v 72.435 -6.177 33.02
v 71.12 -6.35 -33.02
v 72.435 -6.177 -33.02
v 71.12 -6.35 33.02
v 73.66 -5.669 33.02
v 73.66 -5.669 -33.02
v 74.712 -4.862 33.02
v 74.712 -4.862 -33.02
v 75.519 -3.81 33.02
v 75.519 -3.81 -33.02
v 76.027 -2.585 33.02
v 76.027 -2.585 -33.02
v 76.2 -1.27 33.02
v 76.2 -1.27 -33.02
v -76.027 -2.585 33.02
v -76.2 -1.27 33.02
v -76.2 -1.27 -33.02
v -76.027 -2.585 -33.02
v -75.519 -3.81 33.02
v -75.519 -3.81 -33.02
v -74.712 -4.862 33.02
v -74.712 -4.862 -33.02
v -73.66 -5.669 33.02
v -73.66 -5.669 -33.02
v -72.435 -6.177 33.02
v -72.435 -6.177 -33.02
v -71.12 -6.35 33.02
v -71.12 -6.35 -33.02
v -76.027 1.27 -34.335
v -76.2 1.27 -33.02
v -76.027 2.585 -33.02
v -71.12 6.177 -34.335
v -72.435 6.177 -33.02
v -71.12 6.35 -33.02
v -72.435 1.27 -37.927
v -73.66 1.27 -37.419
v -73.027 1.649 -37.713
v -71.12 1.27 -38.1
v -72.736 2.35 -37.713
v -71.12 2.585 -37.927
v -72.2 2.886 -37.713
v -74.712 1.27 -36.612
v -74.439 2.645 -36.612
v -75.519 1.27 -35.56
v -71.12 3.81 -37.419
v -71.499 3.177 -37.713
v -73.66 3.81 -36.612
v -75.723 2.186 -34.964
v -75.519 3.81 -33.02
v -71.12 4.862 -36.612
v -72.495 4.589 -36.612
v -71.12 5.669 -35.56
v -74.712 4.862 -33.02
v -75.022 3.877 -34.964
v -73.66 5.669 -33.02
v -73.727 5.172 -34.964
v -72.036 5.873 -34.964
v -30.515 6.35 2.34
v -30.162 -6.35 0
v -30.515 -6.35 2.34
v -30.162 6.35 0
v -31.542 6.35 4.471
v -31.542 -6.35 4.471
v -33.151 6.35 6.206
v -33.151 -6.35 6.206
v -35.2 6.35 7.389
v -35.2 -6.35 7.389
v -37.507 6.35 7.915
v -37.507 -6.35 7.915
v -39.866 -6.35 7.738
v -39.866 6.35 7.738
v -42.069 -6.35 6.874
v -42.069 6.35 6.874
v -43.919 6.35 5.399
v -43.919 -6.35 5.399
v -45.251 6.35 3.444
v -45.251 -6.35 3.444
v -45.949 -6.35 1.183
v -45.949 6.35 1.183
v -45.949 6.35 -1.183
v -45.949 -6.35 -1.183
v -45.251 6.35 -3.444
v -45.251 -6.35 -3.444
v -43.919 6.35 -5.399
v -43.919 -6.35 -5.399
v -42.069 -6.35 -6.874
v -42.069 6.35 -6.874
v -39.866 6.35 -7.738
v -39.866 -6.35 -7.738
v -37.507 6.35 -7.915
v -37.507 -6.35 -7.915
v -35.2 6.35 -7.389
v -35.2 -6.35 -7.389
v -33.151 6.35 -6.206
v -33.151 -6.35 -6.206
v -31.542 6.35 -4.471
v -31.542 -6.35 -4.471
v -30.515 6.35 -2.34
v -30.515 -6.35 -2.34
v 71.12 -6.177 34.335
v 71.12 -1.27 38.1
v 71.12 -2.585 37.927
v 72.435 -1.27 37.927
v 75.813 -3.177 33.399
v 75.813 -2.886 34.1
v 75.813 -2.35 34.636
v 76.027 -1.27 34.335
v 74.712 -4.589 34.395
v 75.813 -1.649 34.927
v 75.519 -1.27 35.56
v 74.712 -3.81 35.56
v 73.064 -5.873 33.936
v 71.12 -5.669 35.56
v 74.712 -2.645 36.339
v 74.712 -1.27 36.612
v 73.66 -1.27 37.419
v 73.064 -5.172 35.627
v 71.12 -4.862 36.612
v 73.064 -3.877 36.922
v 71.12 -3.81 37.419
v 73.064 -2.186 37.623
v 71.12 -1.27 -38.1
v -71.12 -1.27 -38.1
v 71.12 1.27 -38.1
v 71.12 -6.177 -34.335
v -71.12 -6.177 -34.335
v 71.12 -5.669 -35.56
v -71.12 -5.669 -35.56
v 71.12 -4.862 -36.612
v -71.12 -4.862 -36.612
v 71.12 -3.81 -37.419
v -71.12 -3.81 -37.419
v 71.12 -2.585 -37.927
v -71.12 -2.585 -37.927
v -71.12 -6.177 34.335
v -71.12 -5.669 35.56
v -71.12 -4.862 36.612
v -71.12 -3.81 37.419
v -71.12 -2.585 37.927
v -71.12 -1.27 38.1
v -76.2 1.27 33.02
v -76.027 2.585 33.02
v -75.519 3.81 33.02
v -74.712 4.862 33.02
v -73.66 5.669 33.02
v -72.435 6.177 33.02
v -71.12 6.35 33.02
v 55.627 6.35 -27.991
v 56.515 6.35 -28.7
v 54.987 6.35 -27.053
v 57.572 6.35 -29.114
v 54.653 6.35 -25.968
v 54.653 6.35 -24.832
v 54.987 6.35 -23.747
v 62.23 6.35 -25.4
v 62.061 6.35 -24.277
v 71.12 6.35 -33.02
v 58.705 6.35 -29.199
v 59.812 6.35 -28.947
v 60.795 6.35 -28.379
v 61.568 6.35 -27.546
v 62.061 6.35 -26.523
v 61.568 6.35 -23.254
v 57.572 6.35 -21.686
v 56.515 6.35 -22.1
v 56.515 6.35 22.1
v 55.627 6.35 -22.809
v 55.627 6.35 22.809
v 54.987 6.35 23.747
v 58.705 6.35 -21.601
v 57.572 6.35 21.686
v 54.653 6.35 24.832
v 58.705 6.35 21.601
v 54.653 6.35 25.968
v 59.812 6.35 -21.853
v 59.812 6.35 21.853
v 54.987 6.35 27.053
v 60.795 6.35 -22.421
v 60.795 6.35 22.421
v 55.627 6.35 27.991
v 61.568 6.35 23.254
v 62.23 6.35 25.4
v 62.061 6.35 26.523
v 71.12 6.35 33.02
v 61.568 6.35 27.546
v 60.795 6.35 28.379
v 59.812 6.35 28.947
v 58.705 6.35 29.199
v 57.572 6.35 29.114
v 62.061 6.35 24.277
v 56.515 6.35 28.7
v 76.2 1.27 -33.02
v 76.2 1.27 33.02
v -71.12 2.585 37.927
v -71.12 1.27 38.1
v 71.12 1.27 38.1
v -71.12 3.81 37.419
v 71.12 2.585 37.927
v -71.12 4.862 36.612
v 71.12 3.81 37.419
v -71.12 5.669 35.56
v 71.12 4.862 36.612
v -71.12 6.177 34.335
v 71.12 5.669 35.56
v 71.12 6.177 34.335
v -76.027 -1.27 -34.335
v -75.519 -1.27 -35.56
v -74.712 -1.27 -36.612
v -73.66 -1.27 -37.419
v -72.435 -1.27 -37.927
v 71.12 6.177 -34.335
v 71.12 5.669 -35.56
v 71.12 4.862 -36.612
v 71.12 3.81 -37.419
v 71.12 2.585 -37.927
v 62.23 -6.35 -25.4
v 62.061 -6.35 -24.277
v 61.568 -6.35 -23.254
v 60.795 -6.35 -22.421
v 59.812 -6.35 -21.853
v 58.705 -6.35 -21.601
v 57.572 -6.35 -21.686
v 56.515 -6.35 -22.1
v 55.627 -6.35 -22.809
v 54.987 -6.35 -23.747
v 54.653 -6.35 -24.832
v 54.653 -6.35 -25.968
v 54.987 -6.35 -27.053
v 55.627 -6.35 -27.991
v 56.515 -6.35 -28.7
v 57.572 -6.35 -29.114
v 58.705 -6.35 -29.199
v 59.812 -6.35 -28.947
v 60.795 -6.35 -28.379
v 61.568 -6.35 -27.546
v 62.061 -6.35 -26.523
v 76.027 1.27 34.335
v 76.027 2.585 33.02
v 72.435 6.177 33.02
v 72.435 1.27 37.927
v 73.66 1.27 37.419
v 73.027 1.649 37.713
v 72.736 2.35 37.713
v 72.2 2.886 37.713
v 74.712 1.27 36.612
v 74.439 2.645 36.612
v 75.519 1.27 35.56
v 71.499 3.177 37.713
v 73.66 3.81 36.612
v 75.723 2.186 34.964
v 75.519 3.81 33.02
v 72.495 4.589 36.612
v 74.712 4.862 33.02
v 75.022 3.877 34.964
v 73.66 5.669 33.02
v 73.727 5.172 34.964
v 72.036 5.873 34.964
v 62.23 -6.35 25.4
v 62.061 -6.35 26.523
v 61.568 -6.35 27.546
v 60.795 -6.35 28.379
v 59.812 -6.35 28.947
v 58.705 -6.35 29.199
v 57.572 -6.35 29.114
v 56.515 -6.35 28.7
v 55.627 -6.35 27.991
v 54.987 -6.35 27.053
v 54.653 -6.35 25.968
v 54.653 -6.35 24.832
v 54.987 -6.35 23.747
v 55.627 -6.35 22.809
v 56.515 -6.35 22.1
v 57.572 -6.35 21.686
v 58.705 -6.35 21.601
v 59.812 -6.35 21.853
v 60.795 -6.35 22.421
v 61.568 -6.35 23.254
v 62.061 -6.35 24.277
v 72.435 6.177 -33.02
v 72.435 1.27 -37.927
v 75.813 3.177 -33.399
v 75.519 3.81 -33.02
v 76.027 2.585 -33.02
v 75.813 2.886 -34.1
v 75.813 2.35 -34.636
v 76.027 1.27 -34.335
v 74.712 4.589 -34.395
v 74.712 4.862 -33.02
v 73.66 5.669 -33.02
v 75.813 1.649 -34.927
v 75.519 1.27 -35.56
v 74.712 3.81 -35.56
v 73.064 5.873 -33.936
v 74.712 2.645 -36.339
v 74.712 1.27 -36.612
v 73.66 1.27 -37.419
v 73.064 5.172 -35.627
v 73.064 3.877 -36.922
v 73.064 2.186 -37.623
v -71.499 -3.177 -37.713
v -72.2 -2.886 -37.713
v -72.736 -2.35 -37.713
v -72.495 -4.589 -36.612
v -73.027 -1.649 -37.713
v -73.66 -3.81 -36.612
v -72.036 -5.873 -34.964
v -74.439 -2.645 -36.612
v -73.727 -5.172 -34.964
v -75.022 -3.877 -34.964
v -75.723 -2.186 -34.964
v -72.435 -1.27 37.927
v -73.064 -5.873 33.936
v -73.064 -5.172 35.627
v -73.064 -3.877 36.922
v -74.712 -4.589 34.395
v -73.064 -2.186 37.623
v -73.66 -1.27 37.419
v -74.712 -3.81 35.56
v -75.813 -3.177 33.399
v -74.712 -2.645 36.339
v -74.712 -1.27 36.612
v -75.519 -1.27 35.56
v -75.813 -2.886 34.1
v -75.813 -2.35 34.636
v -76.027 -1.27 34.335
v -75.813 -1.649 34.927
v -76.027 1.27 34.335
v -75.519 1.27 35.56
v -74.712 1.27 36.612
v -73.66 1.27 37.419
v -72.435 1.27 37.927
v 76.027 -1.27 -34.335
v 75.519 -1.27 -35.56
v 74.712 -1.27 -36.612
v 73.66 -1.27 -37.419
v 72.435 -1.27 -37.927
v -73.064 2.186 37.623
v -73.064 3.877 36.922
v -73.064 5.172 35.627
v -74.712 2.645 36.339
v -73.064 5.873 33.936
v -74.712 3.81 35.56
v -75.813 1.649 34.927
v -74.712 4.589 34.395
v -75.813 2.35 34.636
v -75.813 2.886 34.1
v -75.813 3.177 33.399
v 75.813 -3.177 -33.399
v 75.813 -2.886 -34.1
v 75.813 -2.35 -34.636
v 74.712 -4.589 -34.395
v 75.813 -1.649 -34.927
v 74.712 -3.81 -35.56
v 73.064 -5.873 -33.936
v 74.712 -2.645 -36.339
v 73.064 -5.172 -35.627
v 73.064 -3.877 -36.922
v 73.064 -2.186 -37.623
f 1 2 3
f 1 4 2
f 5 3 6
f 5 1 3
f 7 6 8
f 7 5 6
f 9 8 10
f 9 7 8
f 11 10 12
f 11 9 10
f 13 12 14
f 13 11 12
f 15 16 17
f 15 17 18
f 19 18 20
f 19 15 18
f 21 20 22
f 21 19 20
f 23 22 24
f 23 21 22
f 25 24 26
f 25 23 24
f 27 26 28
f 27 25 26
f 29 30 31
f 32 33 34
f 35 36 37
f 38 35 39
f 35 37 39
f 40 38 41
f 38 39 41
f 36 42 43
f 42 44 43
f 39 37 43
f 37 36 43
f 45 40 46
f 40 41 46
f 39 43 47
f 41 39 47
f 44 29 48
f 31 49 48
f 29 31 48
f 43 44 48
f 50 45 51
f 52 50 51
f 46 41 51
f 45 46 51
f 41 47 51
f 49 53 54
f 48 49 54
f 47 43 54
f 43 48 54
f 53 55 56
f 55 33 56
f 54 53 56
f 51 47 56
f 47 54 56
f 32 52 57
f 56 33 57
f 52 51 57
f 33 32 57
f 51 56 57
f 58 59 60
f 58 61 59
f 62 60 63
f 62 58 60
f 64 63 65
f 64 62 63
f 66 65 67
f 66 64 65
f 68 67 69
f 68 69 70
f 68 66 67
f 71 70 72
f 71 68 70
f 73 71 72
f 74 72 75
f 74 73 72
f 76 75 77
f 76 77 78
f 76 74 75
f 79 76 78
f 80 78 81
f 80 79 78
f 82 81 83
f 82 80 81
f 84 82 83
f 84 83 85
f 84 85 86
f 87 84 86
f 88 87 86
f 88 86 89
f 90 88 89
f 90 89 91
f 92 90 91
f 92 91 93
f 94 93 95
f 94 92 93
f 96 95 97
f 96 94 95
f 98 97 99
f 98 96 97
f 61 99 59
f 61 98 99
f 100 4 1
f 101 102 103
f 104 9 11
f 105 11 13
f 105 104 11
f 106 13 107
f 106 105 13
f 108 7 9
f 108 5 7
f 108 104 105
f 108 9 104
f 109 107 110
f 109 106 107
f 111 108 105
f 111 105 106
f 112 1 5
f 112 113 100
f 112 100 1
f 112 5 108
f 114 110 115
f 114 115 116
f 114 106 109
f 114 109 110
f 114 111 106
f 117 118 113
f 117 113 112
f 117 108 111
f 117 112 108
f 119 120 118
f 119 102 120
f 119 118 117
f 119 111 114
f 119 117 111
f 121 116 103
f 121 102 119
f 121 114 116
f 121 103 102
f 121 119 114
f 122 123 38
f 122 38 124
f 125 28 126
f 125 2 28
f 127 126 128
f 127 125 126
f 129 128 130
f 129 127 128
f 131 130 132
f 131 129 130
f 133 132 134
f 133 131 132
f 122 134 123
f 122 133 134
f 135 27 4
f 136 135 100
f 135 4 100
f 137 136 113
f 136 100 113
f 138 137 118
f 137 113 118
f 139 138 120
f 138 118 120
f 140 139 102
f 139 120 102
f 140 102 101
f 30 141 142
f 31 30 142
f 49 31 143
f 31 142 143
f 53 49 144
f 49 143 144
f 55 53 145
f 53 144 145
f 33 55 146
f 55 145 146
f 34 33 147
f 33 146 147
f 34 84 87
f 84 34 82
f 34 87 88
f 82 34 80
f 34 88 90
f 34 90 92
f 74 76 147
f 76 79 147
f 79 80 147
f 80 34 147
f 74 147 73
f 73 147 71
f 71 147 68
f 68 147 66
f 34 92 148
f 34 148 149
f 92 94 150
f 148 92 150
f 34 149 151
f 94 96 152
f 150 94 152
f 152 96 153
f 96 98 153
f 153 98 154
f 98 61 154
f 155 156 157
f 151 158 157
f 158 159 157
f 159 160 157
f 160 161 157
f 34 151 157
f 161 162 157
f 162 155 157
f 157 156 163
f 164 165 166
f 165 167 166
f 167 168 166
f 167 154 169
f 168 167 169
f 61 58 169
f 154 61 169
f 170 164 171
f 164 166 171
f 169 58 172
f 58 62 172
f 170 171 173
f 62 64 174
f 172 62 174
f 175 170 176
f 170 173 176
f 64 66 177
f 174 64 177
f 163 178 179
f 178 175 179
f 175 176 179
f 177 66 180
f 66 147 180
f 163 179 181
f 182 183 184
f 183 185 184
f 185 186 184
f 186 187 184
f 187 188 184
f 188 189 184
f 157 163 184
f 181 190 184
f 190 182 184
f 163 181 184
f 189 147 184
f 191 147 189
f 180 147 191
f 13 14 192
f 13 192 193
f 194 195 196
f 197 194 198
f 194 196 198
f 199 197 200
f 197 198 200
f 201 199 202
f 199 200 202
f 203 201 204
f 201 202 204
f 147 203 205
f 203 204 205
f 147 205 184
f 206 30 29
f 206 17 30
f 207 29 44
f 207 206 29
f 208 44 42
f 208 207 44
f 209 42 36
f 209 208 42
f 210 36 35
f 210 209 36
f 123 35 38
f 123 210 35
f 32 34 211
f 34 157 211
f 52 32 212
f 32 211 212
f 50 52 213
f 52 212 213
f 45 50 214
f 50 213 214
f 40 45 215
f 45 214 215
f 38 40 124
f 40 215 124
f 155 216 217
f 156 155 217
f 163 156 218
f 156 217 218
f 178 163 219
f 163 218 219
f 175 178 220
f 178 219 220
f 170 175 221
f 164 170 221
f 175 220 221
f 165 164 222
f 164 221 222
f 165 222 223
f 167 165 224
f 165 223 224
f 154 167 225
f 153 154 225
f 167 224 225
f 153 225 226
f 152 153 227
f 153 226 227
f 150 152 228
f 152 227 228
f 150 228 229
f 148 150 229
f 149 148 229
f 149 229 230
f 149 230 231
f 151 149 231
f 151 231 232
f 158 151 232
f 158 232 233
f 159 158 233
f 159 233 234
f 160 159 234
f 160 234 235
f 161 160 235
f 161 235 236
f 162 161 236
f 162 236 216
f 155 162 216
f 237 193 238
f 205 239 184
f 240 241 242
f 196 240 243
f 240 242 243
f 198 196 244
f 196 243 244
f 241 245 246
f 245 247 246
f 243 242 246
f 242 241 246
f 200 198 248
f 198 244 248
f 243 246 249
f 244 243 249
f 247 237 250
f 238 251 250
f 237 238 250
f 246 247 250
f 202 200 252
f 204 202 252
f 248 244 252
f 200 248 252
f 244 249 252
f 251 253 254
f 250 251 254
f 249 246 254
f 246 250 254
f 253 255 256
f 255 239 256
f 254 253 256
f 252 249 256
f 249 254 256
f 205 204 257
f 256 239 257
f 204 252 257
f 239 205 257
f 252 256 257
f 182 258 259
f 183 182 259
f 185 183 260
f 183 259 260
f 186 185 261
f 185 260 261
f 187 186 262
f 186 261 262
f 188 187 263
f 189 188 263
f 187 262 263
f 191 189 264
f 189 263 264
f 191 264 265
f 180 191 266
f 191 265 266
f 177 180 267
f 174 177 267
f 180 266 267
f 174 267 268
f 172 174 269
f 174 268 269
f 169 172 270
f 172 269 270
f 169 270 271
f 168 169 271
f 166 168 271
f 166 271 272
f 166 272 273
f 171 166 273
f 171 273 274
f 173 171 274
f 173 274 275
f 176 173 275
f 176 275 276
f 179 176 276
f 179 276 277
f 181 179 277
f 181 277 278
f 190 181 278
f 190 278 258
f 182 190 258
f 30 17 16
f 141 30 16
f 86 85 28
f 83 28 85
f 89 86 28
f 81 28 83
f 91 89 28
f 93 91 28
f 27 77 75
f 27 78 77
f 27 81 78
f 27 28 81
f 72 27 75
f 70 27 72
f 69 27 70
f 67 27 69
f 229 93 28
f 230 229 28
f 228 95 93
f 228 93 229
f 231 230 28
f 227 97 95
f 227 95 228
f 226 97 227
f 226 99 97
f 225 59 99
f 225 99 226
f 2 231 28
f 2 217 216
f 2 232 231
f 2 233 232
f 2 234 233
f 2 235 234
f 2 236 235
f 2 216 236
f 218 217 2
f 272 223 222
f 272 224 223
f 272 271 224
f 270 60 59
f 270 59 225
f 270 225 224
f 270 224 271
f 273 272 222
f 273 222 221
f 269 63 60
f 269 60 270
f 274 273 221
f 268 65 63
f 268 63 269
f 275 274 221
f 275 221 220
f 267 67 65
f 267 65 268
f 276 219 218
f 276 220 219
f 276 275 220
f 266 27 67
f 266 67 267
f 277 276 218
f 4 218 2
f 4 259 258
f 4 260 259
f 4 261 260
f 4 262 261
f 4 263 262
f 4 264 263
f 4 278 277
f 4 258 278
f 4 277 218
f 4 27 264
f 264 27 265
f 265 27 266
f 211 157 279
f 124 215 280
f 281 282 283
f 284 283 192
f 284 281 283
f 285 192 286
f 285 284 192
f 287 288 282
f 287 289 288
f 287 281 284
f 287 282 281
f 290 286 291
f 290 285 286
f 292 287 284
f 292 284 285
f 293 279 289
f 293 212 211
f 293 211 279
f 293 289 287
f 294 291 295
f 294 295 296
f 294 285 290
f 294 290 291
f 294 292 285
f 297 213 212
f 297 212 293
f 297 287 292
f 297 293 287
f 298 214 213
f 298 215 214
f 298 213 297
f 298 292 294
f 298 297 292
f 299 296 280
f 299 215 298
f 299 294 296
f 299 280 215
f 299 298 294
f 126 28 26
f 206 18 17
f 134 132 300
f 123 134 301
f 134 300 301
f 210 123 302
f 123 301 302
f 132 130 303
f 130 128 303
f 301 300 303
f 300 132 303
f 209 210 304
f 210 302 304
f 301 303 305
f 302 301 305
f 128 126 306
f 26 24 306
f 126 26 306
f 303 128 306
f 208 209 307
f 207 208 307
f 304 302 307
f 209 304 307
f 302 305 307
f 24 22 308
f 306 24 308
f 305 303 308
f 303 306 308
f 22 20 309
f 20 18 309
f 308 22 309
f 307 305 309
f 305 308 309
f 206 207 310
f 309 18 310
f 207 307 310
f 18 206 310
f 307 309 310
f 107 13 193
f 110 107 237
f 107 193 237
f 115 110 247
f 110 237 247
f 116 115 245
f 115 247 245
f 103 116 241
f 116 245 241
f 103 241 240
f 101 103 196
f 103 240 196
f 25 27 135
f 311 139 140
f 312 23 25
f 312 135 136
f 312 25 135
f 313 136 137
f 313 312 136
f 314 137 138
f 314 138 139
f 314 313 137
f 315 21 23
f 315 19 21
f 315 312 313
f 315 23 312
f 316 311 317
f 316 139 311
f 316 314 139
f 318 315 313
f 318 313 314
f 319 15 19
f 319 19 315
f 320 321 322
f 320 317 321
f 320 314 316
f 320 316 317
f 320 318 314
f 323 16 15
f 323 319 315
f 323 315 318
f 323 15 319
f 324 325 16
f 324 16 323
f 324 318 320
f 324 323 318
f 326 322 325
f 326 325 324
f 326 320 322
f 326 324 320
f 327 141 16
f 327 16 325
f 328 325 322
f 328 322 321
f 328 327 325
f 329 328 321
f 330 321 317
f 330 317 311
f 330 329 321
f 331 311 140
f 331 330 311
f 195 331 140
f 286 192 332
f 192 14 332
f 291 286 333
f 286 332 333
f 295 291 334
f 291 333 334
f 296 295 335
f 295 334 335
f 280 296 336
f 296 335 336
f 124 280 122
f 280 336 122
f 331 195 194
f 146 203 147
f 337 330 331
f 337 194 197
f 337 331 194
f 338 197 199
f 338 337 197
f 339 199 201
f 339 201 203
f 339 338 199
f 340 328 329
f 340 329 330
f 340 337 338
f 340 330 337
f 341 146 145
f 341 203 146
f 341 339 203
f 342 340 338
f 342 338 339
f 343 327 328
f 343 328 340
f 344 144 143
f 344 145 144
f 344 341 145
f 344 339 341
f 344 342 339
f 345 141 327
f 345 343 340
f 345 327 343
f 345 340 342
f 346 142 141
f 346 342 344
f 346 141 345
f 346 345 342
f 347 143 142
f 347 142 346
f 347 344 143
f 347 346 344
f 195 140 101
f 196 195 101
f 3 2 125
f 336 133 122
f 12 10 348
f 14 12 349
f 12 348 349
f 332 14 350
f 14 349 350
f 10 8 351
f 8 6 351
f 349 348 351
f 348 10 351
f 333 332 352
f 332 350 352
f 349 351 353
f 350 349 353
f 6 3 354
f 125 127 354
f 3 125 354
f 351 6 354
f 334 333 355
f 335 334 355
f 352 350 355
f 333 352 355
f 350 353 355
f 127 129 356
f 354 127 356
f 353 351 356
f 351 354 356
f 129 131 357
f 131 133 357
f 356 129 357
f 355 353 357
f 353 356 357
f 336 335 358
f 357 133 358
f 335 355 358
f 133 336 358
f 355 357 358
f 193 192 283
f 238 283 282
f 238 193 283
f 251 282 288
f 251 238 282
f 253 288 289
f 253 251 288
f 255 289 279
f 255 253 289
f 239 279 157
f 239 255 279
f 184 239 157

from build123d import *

# Parameters (mm, degrees)
F0_W         = 152.4
F0_H         = 76.2
F0_R         = 7.9375
F1_DEPTH     = 6.35
F2_R         = 5.08
F3_T1_DEPTH  = 2.54
F3_S5_W      = 5.08
F3_S5_H      = 5.08
F3_T6_DEPTH  = 5.08
F3_S11_W     = 5.08
F3_S11_H     = 5.08
F3_T12_DEPTH = 5.08
F4_R         = 3.81
F5_DEPTH     = 25.4


# Not quite as in the source:
# - a fillet or chamfer that OpenCascade refuses, or shapes differently, is made with other operations: its cross-section is extruded or revolved along the edge and cut away or added


with BuildPart() as f1:
    # F0 (on Front) → F1 (new body, symmetric)
    with BuildSketch(Plane.XZ):
        Rectangle(F0_W, F0_H)
        with Locations((-38.1, 0)):
            Circle(F0_R, mode=Mode.SUBTRACT)
    extrude(amount=F1_DEPTH, both=True)

    # F2
    f2_edges = [f1.edges().sort_by_distance(p)[0] for p in [
        (0, -6.35, 38.1),
        (-76.2, -6.35, 0),
        (0, -6.35, -38.1),
        (76.2, -6.35, 0),
        (-76.2, 6.35, 0),
        (-76.2, 0, -38.1),
        (0, 6.35, -38.1),
        (76.2, 6.35, 0),
        (76.2, 0, -38.1),
        (76.2, 0, 38.1),
        (0, 6.35, 38.1),
    ]]
    fillet(f2_edges, radius=F2_R)

    # F3: fillet of radius 5.08 on 1 edges, made by hand

    # F3_s2 → F3_t1 (cut)
    with BuildSketch(Plane.XZ.offset(-1.27)):
        with BuildLine():
            ThreePointArc((-76.2, 33.02), (-74.7121024484, 36.6121024484), (-71.12, 38.1))
            Line((-71.12, 38.1), (-76.2, 38.1))
            Line((-76.2, 38.1), (-76.2, 33.02))
        make_face()
    extrude(amount=F3_T1_DEPTH, mode=Mode.SUBTRACT)


with BuildPart() as f3_tool4:
    # F3_s5 → F3_t6 (new body)
    with BuildSketch(Plane.YZ.offset(-71.12)):
        with Locations((-3.81, 35.56)):
            Rectangle(F3_S5_W, F3_S5_H)
    extrude(amount=-F3_T6_DEPTH)

    # F3_s7 → F3_t8 (revolve, cut)
    with BuildSketch(Plane(origin=(-71.12, -1.27, 33.02), x_dir=(0, 0.7071067812, -0.7071067812), z_dir=(0, 0.7071067812, 0.7071067812))):
        with BuildLine():
            ThreePointArc((0, -5.08), (5.08, 0), (0, 5.08))
            Line((0, 5.08), (0, -5.08))
        make_face()
    revolve(axis=Axis((-71.12, -1.27, 33.02), (-1, 0, 0)), mode=Mode.SUBTRACT)


with BuildPart() as f1_1:
    add(f1.part)

    # F3_t3: cut F3_tool4
    add(f3_tool4.part, mode=Mode.SUBTRACT)


with BuildPart() as f3_tool10:
    # F3_s11 → F3_t12 (new body)
    with BuildSketch(Plane.YZ.offset(-71.12)):
        with Locations((3.81, 35.56)):
            Rectangle(F3_S11_W, F3_S11_H)
    extrude(amount=-F3_T12_DEPTH)

    # F3_s13 → F3_t14 (revolve, cut)
    with BuildSketch(Plane(origin=(-71.12, 1.27, 33.02), x_dir=(0, -0.7071067812, -0.7071067812), z_dir=(0, 0.7071067812, -0.7071067812))):
        with BuildLine():
            ThreePointArc((0, -5.08), (5.08, 0), (0, 5.08))
            Line((0, 5.08), (0, -5.08))
        make_face()
    revolve(axis=Axis((-71.12, 1.27, 33.02), (-1, 0, 0)), mode=Mode.SUBTRACT)


with BuildPart() as f1_2:
    add(f1_1.part)

    # F3_t9: cut F3_tool10
    add(f3_tool10.part, mode=Mode.SUBTRACT)

    # F4 (on face) → F5 (cut)
    with BuildSketch(Plane.XZ.offset(6.35)):
        with Locations((58.42, 25.4)):
            Circle(F4_R)
        with Locations((58.42, -25.4)):
            Circle(F4_R)
    extrude(amount=-F5_DEPTH, mode=Mode.SUBTRACT)


solid = f1_2.part
